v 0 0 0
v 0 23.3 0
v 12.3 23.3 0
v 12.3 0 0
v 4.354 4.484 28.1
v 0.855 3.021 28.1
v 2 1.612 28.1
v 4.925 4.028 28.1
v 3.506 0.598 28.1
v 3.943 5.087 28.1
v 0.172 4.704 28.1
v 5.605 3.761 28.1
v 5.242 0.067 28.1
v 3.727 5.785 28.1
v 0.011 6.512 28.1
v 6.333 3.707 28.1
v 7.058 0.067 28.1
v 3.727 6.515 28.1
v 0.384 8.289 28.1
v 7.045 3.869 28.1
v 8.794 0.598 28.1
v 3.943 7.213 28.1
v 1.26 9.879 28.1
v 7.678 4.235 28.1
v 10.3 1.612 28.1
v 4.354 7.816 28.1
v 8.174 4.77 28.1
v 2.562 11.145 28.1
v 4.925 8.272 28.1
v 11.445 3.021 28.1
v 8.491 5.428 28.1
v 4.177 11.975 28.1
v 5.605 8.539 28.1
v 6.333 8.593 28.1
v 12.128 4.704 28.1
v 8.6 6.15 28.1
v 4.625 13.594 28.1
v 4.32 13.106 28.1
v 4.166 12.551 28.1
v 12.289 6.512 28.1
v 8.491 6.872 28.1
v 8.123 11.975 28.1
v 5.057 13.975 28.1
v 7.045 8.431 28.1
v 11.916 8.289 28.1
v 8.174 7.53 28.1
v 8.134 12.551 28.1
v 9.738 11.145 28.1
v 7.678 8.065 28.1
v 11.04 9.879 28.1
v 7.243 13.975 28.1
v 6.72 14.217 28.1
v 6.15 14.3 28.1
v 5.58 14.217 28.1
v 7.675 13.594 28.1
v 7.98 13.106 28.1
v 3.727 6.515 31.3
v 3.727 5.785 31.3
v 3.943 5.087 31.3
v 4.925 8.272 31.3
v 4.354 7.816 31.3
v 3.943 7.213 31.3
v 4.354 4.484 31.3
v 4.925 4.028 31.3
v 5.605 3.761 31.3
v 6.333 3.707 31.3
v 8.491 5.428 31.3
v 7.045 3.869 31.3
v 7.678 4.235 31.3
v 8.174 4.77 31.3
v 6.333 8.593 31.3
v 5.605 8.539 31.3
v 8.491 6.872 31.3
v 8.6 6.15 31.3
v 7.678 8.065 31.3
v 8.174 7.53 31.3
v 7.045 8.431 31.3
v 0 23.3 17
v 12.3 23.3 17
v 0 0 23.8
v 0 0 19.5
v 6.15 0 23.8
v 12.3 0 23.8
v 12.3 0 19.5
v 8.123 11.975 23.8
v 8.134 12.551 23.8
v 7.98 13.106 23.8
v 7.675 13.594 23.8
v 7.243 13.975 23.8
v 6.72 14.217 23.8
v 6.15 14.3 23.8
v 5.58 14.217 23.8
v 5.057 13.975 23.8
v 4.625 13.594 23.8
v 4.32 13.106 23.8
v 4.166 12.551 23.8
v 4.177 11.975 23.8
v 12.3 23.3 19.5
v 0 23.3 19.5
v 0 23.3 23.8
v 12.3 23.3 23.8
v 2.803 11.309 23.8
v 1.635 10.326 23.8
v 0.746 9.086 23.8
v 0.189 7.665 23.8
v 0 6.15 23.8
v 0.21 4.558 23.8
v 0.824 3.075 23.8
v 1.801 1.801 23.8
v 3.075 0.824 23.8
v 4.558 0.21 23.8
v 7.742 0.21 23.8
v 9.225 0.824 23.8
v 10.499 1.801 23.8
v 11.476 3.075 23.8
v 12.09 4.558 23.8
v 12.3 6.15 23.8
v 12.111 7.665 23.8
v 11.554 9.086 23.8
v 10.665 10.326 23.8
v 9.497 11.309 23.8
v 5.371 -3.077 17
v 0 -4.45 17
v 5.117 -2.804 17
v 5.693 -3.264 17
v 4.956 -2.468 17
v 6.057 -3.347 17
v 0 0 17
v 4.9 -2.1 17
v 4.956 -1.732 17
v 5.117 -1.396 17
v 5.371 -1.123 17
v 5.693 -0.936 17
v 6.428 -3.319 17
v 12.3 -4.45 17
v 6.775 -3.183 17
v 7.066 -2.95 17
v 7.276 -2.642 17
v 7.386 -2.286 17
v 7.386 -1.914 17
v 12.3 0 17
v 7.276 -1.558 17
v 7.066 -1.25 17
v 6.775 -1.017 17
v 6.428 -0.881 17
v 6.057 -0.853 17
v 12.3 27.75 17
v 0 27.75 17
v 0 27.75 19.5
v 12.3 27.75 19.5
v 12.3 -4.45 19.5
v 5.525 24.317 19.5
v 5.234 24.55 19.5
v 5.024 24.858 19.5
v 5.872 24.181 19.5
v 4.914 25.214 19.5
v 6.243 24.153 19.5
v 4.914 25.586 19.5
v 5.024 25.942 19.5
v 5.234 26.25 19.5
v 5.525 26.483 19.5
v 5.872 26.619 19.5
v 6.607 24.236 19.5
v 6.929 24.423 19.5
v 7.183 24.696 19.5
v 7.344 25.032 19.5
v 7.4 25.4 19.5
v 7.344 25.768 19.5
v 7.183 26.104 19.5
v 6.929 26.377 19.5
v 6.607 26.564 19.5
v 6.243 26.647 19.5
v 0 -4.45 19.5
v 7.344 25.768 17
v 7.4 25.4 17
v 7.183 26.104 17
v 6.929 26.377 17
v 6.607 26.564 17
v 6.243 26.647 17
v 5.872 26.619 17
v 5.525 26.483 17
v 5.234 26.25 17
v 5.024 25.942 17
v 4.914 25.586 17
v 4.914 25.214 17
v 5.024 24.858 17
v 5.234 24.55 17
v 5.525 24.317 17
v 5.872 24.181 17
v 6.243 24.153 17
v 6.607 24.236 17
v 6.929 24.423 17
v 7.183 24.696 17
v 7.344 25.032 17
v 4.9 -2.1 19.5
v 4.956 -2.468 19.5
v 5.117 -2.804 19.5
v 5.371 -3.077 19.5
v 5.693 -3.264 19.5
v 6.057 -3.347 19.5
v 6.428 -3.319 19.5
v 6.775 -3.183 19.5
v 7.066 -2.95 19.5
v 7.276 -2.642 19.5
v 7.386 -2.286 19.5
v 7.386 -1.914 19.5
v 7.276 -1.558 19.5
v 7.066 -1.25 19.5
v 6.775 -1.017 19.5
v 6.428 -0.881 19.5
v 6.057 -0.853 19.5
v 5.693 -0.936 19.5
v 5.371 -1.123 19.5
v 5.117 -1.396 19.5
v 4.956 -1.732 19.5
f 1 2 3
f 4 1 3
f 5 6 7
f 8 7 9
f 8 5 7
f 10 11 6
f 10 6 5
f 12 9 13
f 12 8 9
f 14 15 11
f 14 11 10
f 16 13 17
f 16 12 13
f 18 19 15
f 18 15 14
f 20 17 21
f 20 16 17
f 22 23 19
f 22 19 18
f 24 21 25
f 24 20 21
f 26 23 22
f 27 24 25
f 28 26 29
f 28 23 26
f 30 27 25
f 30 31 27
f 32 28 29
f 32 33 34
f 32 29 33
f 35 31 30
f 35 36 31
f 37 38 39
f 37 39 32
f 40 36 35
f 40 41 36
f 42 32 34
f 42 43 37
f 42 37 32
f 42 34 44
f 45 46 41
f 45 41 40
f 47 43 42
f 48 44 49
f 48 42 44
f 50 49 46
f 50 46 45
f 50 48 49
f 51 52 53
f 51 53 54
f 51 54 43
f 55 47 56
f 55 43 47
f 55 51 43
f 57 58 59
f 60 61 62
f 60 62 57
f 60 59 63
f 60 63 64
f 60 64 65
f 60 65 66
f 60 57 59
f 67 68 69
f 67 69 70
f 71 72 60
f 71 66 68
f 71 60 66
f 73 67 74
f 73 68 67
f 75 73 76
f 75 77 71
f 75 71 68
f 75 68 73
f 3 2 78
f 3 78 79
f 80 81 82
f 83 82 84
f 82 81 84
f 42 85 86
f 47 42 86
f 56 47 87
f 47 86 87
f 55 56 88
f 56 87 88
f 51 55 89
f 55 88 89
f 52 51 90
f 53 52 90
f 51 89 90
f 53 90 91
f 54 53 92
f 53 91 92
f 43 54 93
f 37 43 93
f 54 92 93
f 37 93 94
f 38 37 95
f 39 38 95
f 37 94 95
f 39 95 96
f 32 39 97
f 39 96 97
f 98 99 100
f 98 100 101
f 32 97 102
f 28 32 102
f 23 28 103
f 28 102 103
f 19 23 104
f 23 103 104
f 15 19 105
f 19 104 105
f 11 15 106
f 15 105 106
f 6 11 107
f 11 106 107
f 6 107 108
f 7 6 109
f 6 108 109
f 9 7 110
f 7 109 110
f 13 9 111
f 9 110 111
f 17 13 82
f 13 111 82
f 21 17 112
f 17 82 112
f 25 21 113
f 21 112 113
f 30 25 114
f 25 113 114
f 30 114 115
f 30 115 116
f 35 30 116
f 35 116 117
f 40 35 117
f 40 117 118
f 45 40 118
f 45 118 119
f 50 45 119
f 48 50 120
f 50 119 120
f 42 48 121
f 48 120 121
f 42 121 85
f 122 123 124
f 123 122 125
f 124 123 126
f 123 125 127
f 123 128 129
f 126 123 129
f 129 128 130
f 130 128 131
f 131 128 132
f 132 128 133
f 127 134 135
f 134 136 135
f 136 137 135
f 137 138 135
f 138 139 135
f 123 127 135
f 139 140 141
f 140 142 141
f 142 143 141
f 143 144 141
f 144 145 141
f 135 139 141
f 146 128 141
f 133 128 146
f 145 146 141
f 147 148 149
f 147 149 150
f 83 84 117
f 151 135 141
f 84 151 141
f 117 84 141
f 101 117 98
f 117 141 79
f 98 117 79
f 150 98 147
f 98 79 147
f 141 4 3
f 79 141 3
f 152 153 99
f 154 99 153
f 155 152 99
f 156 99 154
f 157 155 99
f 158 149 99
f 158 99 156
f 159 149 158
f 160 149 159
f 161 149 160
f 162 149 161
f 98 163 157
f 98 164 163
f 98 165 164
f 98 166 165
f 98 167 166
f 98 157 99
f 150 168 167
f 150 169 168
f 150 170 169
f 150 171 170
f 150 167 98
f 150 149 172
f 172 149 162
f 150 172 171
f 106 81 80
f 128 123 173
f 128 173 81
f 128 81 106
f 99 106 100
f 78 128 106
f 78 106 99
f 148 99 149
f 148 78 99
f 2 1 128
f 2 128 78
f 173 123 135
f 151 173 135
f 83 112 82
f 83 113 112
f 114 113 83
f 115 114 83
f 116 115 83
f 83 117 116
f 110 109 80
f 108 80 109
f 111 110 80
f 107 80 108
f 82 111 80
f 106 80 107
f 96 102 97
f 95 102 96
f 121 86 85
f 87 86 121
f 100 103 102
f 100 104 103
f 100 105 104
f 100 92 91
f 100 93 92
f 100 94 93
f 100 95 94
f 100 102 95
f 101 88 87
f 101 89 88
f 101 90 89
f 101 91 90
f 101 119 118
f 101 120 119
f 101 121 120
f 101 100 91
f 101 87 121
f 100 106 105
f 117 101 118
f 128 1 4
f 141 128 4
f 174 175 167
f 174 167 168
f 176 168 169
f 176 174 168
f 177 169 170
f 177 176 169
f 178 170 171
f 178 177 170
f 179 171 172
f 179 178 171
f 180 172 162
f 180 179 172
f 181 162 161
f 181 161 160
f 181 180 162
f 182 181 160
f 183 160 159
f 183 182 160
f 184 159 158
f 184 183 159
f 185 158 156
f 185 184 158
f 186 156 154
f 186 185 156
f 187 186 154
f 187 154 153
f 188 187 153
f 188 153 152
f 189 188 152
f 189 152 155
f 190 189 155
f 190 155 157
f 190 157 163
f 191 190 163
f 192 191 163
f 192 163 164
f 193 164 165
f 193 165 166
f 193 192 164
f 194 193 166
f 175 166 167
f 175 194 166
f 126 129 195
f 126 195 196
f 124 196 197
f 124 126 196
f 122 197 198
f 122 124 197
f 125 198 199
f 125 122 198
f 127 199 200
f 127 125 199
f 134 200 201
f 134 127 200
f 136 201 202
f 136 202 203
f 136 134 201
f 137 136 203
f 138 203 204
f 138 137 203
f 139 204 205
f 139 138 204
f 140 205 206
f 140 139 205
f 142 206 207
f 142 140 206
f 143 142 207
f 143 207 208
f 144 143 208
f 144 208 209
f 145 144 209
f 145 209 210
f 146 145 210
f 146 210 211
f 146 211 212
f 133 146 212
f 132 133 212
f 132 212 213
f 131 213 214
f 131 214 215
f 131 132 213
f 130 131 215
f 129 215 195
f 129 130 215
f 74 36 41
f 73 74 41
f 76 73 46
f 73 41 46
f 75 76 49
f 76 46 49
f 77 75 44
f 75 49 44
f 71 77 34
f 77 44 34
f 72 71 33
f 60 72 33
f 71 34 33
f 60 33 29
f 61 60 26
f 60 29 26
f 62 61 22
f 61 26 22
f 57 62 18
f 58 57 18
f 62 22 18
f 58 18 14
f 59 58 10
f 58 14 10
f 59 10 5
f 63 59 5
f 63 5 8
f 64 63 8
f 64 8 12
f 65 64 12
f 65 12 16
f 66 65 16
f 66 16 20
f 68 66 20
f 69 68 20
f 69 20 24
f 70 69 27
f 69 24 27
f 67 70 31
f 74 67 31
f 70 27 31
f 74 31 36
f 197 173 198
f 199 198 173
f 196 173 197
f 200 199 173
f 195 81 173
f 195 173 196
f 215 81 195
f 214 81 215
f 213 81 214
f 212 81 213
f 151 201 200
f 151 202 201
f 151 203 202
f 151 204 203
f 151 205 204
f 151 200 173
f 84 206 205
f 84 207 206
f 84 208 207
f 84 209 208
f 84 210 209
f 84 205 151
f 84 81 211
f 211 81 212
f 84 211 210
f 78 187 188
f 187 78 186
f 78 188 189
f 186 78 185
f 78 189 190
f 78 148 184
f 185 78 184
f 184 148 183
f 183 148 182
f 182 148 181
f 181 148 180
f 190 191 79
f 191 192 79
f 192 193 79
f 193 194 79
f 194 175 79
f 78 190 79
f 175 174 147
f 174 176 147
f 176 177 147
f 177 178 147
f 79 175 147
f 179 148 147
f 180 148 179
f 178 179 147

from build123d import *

# Parameters (mm, degrees)
ESQUISSE1_W        = 12.3
ESQUISSE1_H        = 23.3
BOSS_EXTRU_1_DEPTH = 17
ESQUISSE2_W        = 12.3
ESQUISSE2_H        = 32.2
ESQUISSE2_R        = 1.25
BOSS_EXTRU_2_DEPTH = 2.5
ESQUISSE3_W        = 12.3
ESQUISSE3_H        = 23.3
BOSS_EXTRU_3_DEPTH = 4.3
BOSS_EXTRU_4_DEPTH = 4.3
ESQUISSE5_R        = 2.45
BOSS_EXTRU_5_DEPTH = 3.2


with BuildPart() as part:
    # Esquisse1 → Boss.-Extru.1 (new body)
    with BuildSketch(Plane.XY):
        with Locations((6.15, 11.65)):
            Rectangle(ESQUISSE1_W, ESQUISSE1_H)
    extrude(amount=BOSS_EXTRU_1_DEPTH)

    # Esquisse2 → Boss.-Extru.2 (add)
    with BuildSketch(Plane.XY.offset(17)):
        with Locations((6.15, 11.65)):
            Rectangle(ESQUISSE2_W, ESQUISSE2_H)
        with Locations((6.15, 25.4)):
            Circle(ESQUISSE2_R, mode=Mode.SUBTRACT)
        with Locations(Location((6.15, -2.1, 0), (0, 0, 180))):
            Circle(ESQUISSE2_R, mode=Mode.SUBTRACT)
    extrude(amount=BOSS_EXTRU_2_DEPTH)

    # Esquisse3 → Boss.-Extru.3 (add)
    with BuildSketch(Plane.XY.offset(19.5)):
        with Locations((6.15, 11.65)):
            Rectangle(ESQUISSE3_W, ESQUISSE3_H)
    extrude(amount=BOSS_EXTRU_3_DEPTH)

    # Esquisse4 → Boss.-Extru.4 (add)
    with BuildSketch(Plane.XY.offset(23.8)):
        with BuildLine():
            ThreePointArc((4.176616397, 11.974796748), (6.15, 0), (8.123383603, 11.974796748))
            ThreePointArc((8.123383603, 11.974796748), (6.15, 14.3), (4.176616397, 11.974796748))
        make_face()
    extrude(amount=BOSS_EXTRU_4_DEPTH)

    # Esquisse5 → Boss.-Extru.5 (add)
    with BuildSketch(Plane.XY.offset(28.1)):
        with Locations((6.15, 6.15)):
            Circle(ESQUISSE5_R)
    extrude(amount=BOSS_EXTRU_5_DEPTH)


solid = part.part
